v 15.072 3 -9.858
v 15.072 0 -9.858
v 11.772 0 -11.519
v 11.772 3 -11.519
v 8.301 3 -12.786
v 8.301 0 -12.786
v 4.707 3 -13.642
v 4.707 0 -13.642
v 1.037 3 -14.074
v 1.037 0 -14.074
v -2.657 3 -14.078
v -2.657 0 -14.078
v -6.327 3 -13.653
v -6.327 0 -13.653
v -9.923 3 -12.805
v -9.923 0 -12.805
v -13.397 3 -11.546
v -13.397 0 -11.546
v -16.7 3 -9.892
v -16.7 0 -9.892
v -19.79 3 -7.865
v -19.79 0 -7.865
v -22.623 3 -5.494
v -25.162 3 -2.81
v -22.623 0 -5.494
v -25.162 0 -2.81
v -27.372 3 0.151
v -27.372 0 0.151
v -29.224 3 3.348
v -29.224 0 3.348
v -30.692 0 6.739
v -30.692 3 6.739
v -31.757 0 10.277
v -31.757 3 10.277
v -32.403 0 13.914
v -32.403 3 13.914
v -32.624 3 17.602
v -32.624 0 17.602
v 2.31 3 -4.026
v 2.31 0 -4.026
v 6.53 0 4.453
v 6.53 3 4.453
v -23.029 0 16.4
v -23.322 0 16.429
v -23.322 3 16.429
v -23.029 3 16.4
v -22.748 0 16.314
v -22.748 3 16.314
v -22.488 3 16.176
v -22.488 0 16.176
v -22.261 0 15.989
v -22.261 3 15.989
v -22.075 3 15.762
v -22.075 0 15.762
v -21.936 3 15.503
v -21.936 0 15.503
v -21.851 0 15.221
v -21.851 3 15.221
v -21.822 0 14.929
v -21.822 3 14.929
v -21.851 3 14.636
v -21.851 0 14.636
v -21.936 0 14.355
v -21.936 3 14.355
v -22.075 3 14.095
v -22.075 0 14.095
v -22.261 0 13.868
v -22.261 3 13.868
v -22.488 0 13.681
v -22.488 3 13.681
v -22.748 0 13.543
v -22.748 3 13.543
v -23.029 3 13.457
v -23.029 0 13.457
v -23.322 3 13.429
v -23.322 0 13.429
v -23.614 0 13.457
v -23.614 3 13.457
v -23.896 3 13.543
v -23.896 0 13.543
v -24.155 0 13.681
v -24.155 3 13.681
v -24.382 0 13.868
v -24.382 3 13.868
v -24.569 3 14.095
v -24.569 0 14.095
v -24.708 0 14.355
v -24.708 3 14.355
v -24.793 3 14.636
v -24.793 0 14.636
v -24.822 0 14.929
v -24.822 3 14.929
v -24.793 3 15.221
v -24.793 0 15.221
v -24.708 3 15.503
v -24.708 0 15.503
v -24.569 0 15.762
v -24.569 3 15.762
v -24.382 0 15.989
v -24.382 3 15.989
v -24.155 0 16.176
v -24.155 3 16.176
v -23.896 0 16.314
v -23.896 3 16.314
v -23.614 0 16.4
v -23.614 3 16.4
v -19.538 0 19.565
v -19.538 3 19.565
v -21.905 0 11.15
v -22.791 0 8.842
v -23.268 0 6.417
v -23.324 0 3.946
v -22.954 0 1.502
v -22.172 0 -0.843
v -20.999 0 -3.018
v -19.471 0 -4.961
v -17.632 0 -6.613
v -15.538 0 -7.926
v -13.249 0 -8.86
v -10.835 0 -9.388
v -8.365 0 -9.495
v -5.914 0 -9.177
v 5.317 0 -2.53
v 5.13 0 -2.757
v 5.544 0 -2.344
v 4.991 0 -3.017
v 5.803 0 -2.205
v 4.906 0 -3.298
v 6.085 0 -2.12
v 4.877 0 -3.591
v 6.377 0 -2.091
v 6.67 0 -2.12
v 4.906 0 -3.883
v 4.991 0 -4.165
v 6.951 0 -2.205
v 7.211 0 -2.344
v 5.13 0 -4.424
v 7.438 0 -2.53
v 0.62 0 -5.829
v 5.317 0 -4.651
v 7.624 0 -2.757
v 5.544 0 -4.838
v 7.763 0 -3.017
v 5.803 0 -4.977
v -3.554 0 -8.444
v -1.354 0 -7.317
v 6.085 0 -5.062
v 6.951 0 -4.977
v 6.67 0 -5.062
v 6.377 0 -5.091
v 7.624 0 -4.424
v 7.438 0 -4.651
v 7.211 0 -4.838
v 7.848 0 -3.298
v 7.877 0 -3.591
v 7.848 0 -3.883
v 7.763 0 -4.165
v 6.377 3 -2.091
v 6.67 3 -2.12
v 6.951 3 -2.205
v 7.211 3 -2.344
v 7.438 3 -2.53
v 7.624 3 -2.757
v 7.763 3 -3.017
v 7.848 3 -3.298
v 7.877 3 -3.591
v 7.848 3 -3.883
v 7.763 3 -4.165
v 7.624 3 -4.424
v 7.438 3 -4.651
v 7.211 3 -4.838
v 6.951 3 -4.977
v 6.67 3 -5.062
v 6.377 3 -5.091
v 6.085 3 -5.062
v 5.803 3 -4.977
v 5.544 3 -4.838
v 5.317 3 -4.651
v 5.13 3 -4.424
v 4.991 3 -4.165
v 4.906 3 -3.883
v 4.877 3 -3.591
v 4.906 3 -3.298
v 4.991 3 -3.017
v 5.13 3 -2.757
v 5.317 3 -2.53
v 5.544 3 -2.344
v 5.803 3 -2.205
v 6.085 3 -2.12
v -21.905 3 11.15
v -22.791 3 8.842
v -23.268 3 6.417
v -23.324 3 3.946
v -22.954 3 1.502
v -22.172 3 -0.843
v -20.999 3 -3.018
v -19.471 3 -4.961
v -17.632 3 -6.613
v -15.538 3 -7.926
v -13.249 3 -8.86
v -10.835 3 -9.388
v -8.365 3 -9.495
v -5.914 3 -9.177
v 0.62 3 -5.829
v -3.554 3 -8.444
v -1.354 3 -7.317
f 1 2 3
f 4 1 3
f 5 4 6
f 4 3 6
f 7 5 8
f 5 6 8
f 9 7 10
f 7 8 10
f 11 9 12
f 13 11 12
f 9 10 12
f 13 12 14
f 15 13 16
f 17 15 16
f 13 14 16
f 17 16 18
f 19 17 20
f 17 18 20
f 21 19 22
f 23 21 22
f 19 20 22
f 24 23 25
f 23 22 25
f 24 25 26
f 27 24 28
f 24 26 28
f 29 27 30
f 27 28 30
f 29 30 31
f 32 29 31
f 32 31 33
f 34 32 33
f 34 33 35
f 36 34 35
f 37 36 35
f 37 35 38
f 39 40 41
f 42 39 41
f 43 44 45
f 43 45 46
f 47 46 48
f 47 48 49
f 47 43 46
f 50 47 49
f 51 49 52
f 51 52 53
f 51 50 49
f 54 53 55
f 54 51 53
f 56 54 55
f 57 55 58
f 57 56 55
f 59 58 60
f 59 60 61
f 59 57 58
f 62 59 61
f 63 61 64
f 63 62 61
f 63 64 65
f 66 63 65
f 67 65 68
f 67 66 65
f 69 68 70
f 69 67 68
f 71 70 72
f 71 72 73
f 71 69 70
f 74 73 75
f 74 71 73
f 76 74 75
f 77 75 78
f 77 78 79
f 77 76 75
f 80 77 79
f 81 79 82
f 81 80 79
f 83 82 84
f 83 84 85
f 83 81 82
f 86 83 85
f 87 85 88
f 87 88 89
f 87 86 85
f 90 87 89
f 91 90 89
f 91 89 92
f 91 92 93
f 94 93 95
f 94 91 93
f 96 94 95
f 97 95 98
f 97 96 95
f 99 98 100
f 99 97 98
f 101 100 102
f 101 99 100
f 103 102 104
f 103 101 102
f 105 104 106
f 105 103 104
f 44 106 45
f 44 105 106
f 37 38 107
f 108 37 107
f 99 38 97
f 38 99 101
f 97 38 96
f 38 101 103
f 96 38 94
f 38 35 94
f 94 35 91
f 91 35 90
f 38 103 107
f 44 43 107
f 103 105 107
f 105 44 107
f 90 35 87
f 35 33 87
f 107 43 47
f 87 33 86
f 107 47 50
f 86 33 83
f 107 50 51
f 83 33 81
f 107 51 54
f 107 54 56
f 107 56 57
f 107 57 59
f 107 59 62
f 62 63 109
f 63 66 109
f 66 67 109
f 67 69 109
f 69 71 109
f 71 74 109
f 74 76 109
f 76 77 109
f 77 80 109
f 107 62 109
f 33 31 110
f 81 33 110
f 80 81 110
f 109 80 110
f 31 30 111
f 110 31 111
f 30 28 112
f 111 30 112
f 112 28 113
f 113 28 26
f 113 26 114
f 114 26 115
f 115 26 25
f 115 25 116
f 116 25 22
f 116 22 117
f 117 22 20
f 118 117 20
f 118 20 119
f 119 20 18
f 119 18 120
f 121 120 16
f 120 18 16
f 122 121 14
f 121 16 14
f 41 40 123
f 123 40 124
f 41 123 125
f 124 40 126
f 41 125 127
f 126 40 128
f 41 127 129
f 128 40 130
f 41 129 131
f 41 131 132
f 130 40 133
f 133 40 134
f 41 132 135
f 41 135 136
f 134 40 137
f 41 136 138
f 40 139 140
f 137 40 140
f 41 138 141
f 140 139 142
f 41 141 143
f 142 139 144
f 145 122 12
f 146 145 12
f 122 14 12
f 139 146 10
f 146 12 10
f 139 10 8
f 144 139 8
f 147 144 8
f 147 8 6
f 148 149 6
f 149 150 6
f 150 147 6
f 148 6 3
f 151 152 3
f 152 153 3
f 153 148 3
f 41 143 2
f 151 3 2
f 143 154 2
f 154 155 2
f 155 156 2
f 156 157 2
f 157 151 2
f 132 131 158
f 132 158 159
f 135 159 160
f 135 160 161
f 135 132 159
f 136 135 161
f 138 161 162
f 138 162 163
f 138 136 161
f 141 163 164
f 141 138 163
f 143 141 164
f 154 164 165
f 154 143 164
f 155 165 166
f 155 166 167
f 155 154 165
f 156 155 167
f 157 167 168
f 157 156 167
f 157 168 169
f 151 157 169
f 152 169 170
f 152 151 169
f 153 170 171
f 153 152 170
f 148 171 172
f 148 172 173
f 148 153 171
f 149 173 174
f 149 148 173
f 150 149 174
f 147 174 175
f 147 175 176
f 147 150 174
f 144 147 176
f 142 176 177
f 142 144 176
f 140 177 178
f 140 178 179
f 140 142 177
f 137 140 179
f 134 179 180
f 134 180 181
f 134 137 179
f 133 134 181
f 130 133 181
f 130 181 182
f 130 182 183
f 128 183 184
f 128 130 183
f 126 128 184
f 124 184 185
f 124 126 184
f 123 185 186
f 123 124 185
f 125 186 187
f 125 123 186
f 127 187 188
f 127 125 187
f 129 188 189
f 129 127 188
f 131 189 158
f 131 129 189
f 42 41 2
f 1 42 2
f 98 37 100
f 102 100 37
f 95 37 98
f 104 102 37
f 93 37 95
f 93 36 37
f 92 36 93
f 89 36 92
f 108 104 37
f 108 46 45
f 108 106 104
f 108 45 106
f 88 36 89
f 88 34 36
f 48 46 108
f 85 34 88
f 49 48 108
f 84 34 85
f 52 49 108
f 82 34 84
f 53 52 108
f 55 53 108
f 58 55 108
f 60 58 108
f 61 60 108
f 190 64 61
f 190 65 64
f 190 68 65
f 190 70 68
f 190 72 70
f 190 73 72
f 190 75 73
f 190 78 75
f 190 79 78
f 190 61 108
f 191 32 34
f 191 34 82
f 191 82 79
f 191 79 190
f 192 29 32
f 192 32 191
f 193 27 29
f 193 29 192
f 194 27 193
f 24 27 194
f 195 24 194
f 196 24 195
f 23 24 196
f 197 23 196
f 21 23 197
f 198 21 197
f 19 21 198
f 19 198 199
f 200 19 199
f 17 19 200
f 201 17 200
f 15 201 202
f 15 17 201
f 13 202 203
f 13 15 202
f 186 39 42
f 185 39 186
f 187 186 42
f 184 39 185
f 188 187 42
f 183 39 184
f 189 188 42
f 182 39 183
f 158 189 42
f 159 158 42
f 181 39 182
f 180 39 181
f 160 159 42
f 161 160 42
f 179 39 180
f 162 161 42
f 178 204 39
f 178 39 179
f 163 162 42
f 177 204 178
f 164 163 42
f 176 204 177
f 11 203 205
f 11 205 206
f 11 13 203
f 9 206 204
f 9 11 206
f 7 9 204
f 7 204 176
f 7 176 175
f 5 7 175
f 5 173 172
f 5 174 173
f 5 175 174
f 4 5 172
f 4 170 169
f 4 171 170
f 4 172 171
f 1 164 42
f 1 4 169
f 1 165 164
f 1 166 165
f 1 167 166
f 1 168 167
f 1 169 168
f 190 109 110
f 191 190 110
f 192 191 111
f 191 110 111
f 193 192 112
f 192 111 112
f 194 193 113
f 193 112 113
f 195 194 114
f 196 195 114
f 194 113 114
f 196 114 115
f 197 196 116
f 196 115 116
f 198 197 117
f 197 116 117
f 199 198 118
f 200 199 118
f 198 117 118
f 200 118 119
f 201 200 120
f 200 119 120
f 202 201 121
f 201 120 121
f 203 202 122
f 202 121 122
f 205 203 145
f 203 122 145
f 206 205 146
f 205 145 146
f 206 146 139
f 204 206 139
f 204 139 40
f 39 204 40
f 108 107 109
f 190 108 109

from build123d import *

# Parameters (mm, degrees)
SKETCH1_R           = 1.5
BOSS_EXTRUDE1_DEPTH = 3


with BuildPart() as part:
    # Sketch1 → Boss-Extrude1 (new body)
    with BuildSketch(Plane(origin=(0, 0, 0), x_dir=(1, 0, 0), z_dir=(0, 1, 0))):
        with BuildLine():
            ThreePointArc((-21.904580175, -11.149573826), (-16.613262981, 7.314570744), (2.310408028, 4.025597064))
            Line((2.310408028, 4.025597064), (6.530490254, -4.452553635))
            Line((6.530490254, -4.452553635), (15.07165127, 9.857606543))
            ThreePointArc((15.07165127, 9.857606543), (-16.700482533, 9.891564727), (-32.623744859, -17.602422915))
            Line((-32.623744859, -17.602422915), (-19.537696929, -19.565138538))
            Line((-19.537696929, -19.565138538), (-21.904580175, -11.149573826))
        make_face()
        with Locations(Location((-23.321800839, -14.928602489, 0), (0, 0, 270))):
            Circle(SKETCH1_R, mode=Mode.SUBTRACT)
        with Locations(Location((6.377238608, 3.590767262, 0), (0, 0, 270))):
            Circle(SKETCH1_R, mode=Mode.SUBTRACT)
    extrude(amount=BOSS_EXTRUDE1_DEPTH)


solid = part.part
